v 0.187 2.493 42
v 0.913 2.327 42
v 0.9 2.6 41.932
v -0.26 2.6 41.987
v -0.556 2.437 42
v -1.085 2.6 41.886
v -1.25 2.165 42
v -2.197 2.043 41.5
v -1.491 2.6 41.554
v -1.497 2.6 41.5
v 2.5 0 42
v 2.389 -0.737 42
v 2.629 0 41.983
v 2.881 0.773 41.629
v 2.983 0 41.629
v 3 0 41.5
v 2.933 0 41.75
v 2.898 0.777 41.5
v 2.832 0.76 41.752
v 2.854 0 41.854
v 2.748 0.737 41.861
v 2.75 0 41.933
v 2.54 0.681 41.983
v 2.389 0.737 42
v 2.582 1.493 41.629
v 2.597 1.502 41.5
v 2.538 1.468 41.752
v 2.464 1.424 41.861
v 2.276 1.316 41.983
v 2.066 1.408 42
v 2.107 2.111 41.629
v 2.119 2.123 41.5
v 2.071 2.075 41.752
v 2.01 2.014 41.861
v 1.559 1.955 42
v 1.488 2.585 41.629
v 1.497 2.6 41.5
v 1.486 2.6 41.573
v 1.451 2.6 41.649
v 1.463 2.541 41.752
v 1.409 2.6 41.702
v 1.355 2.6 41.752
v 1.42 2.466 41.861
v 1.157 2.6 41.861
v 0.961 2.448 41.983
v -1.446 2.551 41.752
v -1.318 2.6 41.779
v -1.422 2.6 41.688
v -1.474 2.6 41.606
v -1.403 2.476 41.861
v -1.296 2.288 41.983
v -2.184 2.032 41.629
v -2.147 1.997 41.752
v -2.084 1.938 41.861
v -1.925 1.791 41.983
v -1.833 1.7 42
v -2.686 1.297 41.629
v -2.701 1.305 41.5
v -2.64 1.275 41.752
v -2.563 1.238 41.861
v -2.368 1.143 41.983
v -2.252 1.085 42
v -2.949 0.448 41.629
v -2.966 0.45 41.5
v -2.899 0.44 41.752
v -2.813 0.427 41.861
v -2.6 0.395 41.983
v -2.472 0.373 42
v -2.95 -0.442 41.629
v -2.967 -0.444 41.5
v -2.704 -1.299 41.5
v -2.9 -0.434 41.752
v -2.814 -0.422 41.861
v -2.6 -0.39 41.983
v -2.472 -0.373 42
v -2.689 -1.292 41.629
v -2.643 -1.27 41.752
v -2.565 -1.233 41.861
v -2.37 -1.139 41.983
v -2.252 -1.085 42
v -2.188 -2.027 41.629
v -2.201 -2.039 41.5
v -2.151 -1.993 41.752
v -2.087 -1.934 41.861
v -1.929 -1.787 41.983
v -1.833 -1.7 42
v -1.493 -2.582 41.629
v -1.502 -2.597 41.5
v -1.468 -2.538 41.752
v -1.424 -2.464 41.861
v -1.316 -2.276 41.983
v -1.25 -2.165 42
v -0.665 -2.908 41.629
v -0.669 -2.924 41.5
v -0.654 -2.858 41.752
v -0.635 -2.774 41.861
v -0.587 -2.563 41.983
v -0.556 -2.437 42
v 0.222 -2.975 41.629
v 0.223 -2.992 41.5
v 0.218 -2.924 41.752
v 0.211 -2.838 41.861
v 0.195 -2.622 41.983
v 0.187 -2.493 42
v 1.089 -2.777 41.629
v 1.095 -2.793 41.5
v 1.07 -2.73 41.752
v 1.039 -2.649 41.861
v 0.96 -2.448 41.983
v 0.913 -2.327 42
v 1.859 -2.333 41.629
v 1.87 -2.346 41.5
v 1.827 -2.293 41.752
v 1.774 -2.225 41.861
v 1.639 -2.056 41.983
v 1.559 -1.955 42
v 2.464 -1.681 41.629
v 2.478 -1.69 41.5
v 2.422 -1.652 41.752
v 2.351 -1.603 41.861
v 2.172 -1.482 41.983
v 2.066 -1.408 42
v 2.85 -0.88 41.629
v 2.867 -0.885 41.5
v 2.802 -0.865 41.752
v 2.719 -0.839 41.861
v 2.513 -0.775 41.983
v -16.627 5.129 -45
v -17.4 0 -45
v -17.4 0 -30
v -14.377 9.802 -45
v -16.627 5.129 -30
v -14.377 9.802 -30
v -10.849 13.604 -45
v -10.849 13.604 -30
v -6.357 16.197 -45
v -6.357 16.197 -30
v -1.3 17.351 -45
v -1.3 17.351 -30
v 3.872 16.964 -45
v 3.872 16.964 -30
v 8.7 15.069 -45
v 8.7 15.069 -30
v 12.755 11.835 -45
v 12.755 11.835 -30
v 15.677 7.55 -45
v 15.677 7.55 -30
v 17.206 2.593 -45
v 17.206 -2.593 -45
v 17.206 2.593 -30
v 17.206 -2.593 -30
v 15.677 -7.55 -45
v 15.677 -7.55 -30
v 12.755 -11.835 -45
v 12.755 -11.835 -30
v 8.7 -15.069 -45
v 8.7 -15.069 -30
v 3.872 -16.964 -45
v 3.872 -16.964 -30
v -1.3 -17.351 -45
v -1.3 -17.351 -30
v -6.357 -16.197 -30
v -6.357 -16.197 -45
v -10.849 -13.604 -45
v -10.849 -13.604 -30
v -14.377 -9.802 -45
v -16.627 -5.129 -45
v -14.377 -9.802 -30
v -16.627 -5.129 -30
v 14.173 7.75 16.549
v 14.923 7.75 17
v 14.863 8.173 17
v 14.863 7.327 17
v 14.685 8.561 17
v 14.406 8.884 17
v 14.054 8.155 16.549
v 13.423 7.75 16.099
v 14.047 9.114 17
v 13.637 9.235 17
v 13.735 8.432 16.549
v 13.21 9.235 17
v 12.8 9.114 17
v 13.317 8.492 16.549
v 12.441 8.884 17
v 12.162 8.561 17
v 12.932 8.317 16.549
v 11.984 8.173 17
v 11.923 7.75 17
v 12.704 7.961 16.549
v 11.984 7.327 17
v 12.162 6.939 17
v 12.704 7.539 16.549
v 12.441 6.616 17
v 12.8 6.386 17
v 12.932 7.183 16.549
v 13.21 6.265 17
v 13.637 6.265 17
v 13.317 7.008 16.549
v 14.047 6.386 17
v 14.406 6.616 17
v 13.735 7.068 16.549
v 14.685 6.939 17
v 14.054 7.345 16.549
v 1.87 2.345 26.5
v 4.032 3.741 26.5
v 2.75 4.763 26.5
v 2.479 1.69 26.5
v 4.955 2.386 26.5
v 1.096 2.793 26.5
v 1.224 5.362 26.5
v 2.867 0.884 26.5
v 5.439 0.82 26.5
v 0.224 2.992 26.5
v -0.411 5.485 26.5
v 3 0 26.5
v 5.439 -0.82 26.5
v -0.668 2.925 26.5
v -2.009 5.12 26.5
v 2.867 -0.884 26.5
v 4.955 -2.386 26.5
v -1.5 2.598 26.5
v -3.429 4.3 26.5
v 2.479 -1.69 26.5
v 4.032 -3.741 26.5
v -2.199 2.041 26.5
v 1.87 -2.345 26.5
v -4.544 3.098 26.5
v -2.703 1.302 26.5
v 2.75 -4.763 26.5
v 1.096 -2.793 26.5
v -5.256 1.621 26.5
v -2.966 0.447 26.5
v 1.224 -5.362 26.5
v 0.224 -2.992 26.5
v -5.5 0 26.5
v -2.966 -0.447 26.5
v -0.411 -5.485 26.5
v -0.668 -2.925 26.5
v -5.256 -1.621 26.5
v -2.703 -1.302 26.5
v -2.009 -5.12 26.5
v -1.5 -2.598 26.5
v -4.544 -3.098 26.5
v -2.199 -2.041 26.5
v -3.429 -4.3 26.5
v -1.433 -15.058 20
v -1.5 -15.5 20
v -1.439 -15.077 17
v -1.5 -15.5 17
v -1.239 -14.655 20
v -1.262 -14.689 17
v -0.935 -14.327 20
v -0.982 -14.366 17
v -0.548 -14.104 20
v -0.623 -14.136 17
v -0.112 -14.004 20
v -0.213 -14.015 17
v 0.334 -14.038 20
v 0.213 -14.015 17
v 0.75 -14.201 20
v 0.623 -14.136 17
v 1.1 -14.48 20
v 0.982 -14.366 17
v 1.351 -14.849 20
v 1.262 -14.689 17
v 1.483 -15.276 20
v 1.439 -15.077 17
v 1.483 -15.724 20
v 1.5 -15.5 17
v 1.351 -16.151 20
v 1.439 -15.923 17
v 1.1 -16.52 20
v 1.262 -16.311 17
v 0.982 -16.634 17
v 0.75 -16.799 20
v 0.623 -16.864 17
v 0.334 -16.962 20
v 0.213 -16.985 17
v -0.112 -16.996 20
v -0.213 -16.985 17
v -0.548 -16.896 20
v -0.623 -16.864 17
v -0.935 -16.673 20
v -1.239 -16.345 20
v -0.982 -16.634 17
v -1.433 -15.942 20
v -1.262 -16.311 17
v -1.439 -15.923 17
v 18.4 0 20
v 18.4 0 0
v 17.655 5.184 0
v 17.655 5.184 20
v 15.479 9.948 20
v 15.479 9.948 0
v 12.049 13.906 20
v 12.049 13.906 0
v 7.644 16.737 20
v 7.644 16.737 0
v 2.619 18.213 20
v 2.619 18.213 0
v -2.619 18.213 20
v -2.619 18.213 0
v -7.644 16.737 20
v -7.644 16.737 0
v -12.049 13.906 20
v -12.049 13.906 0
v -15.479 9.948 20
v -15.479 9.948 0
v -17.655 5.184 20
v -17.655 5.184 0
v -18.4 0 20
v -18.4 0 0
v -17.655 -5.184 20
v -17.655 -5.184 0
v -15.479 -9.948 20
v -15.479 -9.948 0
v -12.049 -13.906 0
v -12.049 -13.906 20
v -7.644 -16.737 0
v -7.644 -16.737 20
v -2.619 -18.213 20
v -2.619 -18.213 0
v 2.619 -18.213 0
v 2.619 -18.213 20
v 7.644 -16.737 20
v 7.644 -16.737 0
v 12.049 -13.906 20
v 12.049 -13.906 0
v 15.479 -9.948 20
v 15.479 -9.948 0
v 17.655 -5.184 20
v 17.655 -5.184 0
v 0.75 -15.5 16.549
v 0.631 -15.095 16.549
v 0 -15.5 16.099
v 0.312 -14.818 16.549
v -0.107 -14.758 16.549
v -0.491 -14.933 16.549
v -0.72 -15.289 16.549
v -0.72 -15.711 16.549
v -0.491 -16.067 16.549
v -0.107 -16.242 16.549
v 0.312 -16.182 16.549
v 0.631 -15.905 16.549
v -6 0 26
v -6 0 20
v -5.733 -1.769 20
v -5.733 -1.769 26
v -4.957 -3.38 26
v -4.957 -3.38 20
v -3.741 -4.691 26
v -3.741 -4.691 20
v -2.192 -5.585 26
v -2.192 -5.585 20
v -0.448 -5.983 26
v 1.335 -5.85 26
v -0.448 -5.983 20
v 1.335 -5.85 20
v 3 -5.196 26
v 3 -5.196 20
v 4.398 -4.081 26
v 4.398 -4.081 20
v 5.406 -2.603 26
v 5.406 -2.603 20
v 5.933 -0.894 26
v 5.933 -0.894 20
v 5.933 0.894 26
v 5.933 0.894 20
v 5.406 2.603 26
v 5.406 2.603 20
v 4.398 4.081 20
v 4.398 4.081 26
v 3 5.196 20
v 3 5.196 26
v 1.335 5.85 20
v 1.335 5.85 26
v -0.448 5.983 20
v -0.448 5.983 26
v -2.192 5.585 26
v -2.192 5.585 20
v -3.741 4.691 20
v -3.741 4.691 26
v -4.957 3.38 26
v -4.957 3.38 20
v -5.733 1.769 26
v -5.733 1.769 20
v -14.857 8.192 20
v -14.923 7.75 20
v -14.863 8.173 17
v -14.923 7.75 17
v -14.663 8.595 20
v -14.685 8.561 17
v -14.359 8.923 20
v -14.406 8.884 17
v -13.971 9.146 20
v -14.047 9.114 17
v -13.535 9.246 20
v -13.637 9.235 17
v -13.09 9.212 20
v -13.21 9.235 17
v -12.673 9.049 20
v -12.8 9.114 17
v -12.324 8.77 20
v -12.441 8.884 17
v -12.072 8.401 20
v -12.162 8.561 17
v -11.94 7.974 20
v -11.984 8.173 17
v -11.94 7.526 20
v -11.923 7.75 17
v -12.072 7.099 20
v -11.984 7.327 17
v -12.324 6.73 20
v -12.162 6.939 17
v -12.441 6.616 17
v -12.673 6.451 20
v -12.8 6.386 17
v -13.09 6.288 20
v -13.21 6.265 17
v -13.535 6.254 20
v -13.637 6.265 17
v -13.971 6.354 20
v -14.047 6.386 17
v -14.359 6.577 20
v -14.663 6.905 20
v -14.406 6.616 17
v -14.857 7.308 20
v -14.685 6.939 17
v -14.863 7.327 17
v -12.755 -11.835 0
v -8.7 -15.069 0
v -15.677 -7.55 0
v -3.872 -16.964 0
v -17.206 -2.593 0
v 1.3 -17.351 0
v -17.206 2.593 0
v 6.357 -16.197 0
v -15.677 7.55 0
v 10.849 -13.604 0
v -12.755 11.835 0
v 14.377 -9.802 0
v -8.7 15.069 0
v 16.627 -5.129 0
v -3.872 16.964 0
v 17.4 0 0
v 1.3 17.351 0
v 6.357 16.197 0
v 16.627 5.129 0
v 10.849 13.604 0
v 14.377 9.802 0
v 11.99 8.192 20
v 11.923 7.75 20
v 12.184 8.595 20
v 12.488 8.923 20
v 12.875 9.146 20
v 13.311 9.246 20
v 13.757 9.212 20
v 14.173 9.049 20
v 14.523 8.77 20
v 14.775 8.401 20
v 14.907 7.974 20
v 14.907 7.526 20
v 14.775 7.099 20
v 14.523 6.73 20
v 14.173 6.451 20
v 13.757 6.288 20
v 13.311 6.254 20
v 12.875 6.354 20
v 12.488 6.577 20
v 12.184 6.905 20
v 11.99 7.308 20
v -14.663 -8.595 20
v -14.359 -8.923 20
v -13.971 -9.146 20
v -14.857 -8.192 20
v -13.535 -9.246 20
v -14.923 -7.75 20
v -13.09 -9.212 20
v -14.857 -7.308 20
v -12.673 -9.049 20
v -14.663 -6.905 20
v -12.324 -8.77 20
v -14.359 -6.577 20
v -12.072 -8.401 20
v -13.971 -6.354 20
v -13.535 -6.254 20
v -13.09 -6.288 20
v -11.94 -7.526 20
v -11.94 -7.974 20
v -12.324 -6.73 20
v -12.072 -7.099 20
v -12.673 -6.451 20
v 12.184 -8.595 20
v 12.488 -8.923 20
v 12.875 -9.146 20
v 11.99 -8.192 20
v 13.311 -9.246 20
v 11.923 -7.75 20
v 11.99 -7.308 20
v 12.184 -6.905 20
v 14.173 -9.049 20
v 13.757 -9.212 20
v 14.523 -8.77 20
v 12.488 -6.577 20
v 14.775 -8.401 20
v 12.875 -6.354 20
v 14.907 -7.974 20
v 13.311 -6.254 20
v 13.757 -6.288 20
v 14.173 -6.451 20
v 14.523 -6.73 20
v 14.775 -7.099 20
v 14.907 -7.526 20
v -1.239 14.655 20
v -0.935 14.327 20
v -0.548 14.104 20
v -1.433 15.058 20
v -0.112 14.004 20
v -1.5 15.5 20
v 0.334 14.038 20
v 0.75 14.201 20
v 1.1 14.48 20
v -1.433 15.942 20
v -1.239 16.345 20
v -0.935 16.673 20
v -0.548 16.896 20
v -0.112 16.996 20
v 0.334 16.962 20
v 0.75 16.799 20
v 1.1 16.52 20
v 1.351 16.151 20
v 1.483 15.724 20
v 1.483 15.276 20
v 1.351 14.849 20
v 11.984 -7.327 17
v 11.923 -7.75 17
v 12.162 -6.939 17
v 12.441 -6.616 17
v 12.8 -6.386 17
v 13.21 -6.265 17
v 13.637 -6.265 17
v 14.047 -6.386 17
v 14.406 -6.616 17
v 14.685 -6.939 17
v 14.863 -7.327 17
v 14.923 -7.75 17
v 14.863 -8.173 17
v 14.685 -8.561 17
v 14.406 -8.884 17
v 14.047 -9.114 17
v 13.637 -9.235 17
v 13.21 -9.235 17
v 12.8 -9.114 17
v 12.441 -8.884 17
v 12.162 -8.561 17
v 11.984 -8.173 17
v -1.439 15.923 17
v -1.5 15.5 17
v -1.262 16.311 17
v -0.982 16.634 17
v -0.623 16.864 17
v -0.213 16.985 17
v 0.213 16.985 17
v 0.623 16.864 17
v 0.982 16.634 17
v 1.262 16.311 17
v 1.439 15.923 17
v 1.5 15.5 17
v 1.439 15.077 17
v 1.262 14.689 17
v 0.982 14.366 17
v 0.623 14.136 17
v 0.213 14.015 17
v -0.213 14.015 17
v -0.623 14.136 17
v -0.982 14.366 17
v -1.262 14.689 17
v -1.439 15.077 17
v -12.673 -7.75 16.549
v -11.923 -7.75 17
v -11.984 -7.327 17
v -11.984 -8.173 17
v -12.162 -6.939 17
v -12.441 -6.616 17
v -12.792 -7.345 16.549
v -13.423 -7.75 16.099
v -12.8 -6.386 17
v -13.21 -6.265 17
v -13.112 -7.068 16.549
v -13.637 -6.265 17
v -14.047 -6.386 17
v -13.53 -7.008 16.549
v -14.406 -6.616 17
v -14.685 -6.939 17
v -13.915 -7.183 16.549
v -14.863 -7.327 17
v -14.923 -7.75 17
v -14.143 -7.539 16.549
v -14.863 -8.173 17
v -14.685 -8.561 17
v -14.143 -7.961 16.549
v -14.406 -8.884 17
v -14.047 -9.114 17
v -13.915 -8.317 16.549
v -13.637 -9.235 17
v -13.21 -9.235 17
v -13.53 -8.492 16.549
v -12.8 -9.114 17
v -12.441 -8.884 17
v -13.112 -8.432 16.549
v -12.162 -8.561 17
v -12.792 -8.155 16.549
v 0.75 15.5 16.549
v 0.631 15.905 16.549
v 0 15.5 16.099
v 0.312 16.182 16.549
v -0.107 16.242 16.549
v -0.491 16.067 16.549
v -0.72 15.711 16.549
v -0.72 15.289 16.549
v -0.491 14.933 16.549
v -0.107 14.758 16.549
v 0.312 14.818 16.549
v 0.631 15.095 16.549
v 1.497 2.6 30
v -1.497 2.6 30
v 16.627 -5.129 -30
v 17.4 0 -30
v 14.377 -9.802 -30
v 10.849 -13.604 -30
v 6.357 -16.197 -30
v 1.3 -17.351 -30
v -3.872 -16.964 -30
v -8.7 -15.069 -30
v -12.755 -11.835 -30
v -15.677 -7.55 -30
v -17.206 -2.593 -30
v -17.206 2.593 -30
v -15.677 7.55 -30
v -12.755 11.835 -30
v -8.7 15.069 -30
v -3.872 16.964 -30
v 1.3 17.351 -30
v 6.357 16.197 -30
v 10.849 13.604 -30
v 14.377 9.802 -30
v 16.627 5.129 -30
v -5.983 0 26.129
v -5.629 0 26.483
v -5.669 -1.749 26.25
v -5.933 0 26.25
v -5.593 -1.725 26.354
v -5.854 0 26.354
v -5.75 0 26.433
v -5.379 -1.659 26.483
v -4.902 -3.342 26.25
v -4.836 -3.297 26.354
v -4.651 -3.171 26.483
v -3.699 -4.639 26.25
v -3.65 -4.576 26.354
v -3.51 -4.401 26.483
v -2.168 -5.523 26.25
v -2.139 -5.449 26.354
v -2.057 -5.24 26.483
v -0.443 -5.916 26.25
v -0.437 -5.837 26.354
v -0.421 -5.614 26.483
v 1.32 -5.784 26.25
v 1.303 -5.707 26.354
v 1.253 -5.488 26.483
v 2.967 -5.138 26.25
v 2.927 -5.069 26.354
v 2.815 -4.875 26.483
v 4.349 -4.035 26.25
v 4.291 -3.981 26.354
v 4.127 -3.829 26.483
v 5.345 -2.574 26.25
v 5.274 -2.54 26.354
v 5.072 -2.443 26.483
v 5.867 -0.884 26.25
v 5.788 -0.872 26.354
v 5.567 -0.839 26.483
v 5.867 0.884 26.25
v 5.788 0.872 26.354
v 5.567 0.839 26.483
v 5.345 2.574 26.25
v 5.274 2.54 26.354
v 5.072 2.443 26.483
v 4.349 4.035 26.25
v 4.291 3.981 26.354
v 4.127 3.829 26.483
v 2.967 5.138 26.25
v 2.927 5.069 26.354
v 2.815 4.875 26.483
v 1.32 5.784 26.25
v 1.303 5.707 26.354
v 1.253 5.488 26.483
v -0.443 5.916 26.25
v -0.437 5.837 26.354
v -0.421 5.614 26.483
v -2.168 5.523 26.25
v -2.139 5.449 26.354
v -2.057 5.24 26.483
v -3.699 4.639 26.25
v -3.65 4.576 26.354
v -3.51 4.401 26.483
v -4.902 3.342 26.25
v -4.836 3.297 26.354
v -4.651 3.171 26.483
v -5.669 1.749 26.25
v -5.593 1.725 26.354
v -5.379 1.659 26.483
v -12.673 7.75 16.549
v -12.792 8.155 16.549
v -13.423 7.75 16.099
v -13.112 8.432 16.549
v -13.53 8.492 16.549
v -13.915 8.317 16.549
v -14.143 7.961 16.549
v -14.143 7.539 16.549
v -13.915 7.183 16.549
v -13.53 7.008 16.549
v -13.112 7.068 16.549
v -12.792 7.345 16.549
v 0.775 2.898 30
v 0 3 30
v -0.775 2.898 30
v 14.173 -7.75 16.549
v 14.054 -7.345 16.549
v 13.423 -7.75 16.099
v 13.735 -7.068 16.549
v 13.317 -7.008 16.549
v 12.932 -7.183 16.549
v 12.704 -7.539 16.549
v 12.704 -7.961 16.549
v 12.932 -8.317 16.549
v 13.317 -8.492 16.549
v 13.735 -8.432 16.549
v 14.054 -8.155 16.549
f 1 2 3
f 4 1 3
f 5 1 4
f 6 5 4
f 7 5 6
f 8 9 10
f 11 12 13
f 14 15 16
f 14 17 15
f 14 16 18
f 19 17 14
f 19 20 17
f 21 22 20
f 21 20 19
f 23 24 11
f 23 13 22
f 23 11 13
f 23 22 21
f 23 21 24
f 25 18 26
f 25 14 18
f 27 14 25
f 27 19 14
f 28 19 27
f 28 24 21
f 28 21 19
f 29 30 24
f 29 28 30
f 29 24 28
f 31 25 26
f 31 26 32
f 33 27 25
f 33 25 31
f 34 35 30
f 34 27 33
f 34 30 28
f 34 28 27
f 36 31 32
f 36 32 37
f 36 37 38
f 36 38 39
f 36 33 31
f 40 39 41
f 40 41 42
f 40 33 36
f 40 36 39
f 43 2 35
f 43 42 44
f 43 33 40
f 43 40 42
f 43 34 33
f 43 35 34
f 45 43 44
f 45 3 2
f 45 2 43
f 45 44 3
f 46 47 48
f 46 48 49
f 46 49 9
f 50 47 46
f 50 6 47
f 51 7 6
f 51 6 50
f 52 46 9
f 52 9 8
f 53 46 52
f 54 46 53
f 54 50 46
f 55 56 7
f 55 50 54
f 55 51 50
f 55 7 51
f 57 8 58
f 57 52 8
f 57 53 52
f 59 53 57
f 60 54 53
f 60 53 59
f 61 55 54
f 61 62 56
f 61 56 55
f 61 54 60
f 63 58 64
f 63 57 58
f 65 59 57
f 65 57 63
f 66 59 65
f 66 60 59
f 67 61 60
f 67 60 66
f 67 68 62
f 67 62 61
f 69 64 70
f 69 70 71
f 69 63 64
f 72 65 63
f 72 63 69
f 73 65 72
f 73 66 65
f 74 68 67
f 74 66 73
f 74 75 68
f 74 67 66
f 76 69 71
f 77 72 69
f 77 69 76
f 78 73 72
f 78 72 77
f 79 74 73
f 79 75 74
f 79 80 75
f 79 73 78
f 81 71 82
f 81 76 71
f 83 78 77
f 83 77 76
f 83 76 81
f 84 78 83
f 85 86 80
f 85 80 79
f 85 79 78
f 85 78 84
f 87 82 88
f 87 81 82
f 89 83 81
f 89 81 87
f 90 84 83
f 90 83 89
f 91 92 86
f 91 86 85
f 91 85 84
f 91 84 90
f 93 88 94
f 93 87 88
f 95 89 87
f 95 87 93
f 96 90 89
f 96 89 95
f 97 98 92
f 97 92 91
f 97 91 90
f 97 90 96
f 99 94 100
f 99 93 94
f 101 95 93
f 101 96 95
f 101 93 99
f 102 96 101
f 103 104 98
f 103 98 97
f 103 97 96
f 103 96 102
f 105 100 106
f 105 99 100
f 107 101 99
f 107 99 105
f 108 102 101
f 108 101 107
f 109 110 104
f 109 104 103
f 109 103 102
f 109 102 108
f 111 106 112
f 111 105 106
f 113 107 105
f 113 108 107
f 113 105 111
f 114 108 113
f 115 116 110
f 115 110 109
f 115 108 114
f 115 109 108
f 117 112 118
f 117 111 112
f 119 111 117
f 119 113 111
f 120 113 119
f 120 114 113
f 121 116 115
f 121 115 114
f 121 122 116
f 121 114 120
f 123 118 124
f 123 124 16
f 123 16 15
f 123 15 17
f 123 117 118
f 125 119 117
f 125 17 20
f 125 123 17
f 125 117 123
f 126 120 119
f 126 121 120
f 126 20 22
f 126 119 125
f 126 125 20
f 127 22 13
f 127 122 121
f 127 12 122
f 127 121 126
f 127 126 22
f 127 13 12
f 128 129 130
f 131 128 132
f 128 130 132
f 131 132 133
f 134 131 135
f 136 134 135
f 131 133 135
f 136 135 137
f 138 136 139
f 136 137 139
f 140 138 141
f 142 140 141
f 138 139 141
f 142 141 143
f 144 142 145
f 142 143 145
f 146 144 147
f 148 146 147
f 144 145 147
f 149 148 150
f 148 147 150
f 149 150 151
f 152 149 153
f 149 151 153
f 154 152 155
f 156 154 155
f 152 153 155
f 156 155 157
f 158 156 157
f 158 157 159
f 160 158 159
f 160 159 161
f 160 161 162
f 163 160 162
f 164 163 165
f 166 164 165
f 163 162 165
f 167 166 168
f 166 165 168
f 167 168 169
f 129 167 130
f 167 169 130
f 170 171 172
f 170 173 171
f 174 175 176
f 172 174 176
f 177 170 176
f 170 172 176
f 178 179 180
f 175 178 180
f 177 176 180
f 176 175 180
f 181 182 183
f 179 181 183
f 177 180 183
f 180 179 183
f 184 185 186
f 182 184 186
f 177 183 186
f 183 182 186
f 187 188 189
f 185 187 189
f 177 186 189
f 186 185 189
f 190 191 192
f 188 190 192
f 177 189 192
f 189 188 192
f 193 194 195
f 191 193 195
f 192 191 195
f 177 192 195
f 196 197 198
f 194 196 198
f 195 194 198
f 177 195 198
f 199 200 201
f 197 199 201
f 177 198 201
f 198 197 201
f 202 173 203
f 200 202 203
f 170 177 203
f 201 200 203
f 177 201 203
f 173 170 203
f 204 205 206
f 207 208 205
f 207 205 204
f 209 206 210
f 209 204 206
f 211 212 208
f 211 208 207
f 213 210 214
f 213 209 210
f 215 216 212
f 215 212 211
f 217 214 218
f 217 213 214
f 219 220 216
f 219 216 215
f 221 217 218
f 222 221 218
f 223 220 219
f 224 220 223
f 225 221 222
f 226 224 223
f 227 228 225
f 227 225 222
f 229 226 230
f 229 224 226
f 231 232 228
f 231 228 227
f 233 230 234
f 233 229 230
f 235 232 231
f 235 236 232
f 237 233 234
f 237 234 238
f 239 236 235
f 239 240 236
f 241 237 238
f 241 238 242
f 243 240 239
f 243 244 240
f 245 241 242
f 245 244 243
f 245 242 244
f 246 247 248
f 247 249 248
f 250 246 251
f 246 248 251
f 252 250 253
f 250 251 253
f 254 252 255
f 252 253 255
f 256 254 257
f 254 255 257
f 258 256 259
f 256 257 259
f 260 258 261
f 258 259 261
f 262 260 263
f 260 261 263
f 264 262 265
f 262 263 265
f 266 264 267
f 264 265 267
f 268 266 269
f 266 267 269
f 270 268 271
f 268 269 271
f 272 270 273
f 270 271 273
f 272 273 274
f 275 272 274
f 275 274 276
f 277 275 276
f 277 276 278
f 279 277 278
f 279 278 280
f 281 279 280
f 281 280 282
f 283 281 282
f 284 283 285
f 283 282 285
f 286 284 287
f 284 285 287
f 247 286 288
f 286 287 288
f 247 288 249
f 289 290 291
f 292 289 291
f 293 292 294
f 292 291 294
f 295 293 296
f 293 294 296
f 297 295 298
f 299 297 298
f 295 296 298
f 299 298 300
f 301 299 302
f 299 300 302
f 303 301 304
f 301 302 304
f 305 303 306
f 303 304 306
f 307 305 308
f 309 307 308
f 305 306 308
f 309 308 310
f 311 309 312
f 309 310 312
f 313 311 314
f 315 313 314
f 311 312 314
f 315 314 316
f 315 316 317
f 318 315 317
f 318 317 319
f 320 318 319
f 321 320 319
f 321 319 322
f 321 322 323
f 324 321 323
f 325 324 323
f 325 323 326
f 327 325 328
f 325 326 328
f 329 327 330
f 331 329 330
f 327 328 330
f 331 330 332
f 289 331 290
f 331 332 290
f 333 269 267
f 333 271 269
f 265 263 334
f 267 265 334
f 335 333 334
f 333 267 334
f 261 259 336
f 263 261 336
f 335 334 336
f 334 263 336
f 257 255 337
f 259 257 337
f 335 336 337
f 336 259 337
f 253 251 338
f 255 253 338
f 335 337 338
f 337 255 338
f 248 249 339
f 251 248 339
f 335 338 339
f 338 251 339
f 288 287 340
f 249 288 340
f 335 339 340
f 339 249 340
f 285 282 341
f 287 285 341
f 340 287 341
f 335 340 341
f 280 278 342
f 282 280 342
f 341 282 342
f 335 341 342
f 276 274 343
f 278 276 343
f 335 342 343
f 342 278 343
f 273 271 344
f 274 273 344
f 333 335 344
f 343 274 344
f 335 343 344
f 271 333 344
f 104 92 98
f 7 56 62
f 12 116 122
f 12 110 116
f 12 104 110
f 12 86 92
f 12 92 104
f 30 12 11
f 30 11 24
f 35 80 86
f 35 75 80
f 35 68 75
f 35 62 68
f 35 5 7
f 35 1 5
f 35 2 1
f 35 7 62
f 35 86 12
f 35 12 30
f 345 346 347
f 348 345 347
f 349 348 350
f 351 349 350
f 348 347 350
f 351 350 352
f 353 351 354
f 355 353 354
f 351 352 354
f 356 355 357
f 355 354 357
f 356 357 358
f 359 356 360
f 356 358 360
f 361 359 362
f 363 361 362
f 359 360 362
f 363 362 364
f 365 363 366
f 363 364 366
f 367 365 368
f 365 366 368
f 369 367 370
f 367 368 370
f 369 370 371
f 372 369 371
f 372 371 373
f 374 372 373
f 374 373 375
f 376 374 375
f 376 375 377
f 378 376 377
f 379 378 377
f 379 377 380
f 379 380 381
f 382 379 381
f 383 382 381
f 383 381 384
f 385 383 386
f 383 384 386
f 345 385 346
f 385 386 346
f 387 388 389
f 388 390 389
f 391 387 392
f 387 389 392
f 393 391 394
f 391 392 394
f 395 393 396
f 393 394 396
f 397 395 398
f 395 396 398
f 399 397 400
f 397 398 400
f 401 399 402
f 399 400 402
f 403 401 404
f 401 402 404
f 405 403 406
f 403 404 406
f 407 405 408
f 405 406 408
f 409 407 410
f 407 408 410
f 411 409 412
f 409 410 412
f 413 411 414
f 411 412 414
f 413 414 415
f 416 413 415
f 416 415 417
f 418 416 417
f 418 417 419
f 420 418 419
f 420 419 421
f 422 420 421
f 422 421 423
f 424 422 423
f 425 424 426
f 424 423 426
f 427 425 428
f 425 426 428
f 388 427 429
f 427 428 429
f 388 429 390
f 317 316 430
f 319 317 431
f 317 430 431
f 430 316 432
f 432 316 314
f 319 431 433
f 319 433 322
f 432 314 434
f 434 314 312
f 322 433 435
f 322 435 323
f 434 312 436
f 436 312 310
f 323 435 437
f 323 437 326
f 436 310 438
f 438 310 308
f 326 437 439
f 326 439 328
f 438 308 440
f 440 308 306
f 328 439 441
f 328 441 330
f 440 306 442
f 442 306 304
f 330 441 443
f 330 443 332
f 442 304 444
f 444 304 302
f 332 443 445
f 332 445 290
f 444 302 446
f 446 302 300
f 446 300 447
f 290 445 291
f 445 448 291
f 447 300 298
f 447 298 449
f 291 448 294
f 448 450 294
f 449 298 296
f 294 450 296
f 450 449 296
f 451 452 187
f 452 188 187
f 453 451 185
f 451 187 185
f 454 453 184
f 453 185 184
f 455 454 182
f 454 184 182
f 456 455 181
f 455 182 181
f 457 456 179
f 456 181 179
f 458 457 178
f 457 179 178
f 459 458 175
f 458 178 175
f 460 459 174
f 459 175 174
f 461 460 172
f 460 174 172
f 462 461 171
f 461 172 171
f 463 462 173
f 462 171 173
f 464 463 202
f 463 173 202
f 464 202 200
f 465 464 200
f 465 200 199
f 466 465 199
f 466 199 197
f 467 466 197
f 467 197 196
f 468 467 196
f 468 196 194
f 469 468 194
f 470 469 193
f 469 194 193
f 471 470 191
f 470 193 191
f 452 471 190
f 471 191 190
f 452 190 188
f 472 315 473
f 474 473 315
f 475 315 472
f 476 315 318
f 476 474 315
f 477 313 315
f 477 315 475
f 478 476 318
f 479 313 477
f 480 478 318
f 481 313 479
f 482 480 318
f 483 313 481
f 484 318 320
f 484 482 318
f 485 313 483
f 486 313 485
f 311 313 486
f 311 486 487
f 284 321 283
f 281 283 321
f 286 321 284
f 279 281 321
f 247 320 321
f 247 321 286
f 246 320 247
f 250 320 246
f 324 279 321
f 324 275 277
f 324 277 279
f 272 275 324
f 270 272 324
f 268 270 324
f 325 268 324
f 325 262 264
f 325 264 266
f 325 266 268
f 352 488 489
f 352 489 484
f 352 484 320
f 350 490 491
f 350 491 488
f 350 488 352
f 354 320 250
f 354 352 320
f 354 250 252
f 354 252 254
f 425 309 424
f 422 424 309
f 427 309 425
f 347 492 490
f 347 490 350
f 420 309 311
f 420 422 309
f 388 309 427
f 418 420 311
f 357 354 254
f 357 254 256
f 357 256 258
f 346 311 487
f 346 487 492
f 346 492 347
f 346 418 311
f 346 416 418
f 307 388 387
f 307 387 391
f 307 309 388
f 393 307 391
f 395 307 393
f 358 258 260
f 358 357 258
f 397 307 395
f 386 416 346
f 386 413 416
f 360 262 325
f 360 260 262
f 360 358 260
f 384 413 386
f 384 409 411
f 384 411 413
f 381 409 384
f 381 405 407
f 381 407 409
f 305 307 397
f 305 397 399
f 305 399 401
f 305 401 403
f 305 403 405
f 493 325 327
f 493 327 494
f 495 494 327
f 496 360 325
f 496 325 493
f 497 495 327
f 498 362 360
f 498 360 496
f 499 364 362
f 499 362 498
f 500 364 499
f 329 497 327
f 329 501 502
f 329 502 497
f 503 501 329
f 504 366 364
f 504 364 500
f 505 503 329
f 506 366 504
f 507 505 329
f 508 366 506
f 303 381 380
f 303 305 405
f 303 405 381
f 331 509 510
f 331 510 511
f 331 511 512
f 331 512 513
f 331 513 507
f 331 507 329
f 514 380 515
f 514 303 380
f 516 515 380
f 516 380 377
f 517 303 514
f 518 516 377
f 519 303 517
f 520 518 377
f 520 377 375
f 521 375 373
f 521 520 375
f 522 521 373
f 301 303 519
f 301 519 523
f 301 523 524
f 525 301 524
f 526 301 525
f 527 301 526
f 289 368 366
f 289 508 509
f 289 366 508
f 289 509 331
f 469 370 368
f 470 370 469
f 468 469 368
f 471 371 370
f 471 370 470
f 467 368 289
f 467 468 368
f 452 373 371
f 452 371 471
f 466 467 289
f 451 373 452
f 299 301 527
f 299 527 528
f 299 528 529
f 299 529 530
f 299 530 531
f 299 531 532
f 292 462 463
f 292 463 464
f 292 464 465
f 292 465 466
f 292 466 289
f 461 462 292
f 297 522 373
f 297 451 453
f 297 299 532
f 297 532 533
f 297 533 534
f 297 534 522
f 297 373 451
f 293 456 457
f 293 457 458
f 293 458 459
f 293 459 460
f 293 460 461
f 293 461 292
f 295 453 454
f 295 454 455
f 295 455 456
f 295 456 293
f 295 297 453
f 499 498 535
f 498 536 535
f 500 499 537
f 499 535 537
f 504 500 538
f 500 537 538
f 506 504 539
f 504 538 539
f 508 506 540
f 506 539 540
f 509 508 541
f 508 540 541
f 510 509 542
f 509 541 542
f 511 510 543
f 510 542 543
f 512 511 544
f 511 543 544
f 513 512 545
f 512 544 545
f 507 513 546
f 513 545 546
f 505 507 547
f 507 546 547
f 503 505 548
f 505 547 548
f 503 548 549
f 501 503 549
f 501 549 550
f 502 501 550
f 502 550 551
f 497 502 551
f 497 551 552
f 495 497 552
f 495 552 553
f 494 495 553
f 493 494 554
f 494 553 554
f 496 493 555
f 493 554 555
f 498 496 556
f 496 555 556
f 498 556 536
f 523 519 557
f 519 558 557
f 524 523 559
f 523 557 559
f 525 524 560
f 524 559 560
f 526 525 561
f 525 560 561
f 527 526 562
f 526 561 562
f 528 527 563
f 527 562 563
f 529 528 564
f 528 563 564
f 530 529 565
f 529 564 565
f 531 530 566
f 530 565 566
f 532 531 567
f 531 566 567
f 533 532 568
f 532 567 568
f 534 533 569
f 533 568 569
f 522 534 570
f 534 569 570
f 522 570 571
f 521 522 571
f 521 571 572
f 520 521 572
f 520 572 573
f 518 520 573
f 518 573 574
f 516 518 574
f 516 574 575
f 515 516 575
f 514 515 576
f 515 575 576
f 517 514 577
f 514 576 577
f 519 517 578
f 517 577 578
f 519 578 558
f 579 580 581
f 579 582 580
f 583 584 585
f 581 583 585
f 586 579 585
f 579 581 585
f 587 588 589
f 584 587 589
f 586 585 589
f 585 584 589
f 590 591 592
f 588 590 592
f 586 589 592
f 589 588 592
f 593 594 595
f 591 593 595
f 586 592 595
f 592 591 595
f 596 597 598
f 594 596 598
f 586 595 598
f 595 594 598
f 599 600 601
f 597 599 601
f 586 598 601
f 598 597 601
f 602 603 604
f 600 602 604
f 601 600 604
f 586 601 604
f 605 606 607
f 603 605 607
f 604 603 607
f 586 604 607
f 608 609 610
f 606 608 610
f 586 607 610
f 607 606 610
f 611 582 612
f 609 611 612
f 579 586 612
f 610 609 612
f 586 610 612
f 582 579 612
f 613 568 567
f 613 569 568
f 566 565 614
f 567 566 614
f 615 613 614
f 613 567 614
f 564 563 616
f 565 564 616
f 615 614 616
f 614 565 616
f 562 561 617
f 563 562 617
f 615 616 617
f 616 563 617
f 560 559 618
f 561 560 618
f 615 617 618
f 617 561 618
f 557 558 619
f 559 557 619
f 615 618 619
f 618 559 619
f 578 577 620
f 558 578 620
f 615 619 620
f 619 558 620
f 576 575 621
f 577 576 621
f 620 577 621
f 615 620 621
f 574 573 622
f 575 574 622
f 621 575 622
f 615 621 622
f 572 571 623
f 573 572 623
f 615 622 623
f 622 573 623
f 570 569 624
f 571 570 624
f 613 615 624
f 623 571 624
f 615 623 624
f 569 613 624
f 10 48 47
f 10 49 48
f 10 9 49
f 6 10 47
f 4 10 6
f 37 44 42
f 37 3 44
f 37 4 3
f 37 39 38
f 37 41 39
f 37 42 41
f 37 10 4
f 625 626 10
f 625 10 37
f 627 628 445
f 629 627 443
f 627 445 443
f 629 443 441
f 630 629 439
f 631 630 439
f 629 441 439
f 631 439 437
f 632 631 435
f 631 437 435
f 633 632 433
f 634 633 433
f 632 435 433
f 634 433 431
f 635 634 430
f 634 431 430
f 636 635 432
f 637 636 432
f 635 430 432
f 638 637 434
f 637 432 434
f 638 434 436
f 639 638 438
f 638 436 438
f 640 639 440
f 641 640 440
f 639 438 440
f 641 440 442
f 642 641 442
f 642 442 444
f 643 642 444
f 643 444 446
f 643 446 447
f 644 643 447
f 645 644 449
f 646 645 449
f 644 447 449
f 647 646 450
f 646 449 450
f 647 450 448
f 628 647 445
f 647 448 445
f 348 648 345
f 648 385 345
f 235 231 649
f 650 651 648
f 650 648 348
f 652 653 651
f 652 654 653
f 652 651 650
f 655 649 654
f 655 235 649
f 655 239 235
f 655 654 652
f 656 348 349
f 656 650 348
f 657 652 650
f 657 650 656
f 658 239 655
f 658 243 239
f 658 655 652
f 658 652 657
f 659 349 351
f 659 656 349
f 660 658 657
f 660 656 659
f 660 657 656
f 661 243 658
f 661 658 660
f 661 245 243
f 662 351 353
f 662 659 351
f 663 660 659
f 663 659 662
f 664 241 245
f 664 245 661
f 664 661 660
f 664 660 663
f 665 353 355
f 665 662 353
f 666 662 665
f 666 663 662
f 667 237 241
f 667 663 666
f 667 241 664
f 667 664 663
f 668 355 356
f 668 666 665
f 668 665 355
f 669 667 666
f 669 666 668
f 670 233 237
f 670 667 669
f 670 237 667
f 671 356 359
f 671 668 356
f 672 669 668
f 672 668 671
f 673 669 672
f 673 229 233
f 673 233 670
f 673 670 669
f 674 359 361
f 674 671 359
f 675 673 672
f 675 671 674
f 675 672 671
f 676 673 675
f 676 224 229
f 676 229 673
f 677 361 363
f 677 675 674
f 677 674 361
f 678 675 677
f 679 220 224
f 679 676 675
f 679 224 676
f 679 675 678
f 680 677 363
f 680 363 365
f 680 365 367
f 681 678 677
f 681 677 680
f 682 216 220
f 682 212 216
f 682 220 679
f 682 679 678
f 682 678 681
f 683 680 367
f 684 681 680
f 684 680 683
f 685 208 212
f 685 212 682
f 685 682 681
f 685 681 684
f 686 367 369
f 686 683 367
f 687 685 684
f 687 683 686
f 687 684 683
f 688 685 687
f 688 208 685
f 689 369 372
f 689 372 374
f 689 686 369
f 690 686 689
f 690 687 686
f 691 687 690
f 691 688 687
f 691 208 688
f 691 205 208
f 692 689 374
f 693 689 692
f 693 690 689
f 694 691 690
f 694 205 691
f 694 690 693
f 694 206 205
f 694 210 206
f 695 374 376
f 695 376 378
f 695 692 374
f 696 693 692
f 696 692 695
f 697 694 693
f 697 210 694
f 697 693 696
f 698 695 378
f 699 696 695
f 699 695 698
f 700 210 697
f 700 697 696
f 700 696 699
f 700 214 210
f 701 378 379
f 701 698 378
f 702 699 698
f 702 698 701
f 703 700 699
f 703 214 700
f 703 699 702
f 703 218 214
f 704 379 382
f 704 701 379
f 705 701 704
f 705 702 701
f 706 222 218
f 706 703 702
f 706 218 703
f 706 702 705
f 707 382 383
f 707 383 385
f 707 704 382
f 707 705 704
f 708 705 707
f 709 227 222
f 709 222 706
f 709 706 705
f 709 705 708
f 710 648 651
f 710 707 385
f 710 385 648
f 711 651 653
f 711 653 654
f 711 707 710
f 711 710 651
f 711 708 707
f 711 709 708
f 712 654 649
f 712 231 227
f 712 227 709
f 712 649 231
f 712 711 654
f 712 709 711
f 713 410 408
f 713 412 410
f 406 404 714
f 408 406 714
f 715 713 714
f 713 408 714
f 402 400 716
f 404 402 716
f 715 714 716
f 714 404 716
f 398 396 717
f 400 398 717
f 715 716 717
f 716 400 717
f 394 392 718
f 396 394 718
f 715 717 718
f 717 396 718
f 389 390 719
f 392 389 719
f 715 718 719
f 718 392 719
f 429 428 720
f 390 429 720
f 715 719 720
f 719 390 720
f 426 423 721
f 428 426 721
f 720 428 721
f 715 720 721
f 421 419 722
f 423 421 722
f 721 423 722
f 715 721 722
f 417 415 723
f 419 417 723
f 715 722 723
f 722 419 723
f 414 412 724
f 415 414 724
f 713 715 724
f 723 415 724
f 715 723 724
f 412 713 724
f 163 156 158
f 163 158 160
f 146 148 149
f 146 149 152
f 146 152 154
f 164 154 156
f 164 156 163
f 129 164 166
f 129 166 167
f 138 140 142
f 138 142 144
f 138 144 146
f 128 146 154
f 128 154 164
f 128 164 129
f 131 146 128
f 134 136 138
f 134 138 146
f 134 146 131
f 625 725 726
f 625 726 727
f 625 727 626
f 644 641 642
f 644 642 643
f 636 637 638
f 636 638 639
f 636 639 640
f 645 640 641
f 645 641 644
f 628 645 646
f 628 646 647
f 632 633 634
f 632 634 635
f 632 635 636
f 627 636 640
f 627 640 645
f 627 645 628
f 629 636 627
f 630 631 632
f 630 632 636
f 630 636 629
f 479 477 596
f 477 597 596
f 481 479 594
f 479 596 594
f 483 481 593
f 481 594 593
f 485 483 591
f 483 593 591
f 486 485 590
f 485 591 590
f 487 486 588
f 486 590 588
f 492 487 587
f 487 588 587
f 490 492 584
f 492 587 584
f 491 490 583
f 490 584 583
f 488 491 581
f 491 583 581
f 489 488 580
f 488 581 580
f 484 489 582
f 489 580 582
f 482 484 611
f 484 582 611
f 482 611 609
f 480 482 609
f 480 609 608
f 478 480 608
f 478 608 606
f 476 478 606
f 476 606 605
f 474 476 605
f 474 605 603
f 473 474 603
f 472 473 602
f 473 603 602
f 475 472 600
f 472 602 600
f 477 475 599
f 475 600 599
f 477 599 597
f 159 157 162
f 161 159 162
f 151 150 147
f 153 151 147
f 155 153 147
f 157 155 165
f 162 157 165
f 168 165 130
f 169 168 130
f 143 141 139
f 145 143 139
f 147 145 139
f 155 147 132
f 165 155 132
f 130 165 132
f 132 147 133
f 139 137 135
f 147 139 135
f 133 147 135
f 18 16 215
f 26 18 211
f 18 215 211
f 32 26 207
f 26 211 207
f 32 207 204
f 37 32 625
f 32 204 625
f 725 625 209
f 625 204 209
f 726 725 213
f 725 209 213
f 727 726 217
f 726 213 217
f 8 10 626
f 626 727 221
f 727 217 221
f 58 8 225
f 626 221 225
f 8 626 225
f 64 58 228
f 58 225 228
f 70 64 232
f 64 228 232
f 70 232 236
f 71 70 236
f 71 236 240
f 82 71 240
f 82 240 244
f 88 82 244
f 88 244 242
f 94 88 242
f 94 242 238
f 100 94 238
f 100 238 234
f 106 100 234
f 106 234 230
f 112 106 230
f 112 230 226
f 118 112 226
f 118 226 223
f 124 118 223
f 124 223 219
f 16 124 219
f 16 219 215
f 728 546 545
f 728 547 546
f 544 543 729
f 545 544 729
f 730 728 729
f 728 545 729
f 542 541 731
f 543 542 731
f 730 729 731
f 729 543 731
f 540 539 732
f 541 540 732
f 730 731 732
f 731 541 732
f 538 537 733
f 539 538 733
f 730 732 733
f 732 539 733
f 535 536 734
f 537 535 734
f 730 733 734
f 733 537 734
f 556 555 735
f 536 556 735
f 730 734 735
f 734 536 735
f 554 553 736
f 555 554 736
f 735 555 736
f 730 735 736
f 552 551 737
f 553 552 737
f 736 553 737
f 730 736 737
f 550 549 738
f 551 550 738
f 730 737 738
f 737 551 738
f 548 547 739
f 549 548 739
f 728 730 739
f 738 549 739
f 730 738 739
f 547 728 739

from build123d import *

# Parameters (mm, degrees)
SKETCH1_R                    = 18.4
BOSS_EXTRUDE1_DEPTH          = 20
SKETCH2_R                    = 17.4
BOSS_EXTRUDE2_DEPTH          = 30
SKETCH3_R                    = 6
BOSS_EXTRUDE3_DEPTH          = 6.5
FILLET1_R                    = 0.5
SKETCH4_R                    = 3
BOSS_EXTRUDE4_DEPTH          = 15.5
CUT_EXTRUDE1_START           = -12
CUT_EXTRUDE1_DEPTH           = 12
F_3_0_3_DIAMETER_HOLE1_D     = 3
F_3_0_3_DIAMETER_HOLE1_DEPTH = 3
F_3_0_3_DIAMETER_HOLE1_TIP   = 0.901290929
FILLET4_R                    = 0.5
CROQUIS1_R                   = 17.4
SALIENTE_EXTRUIR3_DEPTH      = 15


with BuildPart() as part:
    # Sketch1 → Boss-Extrude1 (new body)
    with BuildSketch(Plane.XY):
        Circle(SKETCH1_R)
    extrude(amount=BOSS_EXTRUDE1_DEPTH)

    # Sketch2 → Boss-Extrude2 (add)
    with BuildSketch(Plane(origin=(0, 0, 0), x_dir=(-1, 0, 0), z_dir=(0, 0, -1))):
        with Locations(Location((0, 0, 0), (0, 0, 180))):
            Circle(SKETCH2_R)
    extrude(amount=BOSS_EXTRUDE2_DEPTH)

    # Sketch3 → Boss-Extrude3 (add)
    with BuildSketch(Plane.XY.offset(20)):
        with Locations(Location((0, 0, 0), (0, 0, 180))):
            Circle(SKETCH3_R)
    extrude(amount=BOSS_EXTRUDE3_DEPTH)

    # Fillet1
    fillet1_edges = [part.edges().sort_by_distance(p)[0] for p in [
        (6, 0, 26.5),
    ]]
    fillet(fillet1_edges, radius=FILLET1_R)

    # Sketch4 → Boss-Extrude4 (add)
    with BuildSketch(Plane.XY.offset(26.5)):
        Circle(SKETCH4_R)
    extrude(amount=BOSS_EXTRUDE4_DEPTH)

    # Sketch5 → Cut-Extrude1 (cut)
    with BuildSketch(Plane.XY.offset(42).offset(CUT_EXTRUDE1_START)):
        with BuildLine():
            Line((-1.496662955, 2.6), (1.496662955, 2.6))
            ThreePointArc((1.496662955, 2.6), (0, 3), (-1.496662955, 2.6))
        make_face()
    extrude(amount=CUT_EXTRUDE1_DEPTH, mode=Mode.SUBTRACT)

    # Ø3.0 (3) Diameter Hole1
    with Locations(Plane.XY.offset(20)):
        with Locations((-13.423393759, 7.75), (-13.423393759, -7.75), (0, -15.5), (13.423393759, 7.75), (0, 15.5), (13.423393759, -7.75)):
            Hole(F_3_0_3_DIAMETER_HOLE1_D / 2, depth=F_3_0_3_DIAMETER_HOLE1_DEPTH)
            with Locations((0, 0, -(F_3_0_3_DIAMETER_HOLE1_DEPTH + F_3_0_3_DIAMETER_HOLE1_TIP / 2))):  # 118° drill point
                Cone(0, F_3_0_3_DIAMETER_HOLE1_D / 2, F_3_0_3_DIAMETER_HOLE1_TIP, mode=Mode.SUBTRACT)

    # Fillet4
    # the kernel refuses this fillet: 0.5 mm, written as the material it takes off along each edge
    with BuildSketch(Plane(origin=(0, 0, 42), x_dir=(0.46226557285945985, 0.8867415295050273, 0), z_dir=(0.8867415295050273, -0.46226557285945985, 0))) as fillet4_piece_1:
        with BuildLine():
            CenterArc((3 - FILLET4_R, -FILLET4_R), FILLET4_R, 0, 90)
            Line((3 - FILLET4_R, 0), (3 - FILLET4_R, FILLET4_R * 0.02))
            Line((3 - FILLET4_R, FILLET4_R * 0.02), (3 + FILLET4_R * 0.02, FILLET4_R * 0.02))
            Line((3 + FILLET4_R * 0.02, FILLET4_R * 0.02), (3 + FILLET4_R * 0.02, -FILLET4_R))
            Line((3 + FILLET4_R * 0.02, -FILLET4_R), (3, -FILLET4_R))
        make_face()
    revolve(axis=Axis((0, 0, 42), (0, 0, 1)), revolution_arc=297.533397677, mode=Mode.SUBTRACT)
    with BuildSketch(Plane(origin=(0, 0, 42), x_dir=(1, 0, 0), z_dir=(0, -1, 0))) as fillet4_piece_2:
        with BuildLine():
            CenterArc((3 - FILLET4_R, -FILLET4_R), FILLET4_R, 0, 90)
            Line((3 - FILLET4_R, 0), (3 - FILLET4_R, FILLET4_R * 0.02))
            Line((3 - FILLET4_R, FILLET4_R * 0.02), (3 + FILLET4_R * 0.02, FILLET4_R * 0.02))
            Line((3 + FILLET4_R * 0.02, FILLET4_R * 0.02), (3 + FILLET4_R * 0.02, -FILLET4_R))
            Line((3 + FILLET4_R * 0.02, -FILLET4_R), (3, -FILLET4_R))
        make_face()
    revolve(axis=Axis((0, 0, 42), (0, 0, 1)), revolution_arc=117.379597562, mode=Mode.SUBTRACT)


with BuildPart() as body_2:
    # Croquis1 → Saliente-Extruir3 (new body)
    with BuildSketch(Plane(origin=(0, 0, -30), x_dir=(-1, 0, 0), z_dir=(0, 0, -1))):
        Circle(CROQUIS1_R)
    extrude(amount=SALIENTE_EXTRUIR3_DEPTH)


solid = Compound([part.part, body_2.part])
